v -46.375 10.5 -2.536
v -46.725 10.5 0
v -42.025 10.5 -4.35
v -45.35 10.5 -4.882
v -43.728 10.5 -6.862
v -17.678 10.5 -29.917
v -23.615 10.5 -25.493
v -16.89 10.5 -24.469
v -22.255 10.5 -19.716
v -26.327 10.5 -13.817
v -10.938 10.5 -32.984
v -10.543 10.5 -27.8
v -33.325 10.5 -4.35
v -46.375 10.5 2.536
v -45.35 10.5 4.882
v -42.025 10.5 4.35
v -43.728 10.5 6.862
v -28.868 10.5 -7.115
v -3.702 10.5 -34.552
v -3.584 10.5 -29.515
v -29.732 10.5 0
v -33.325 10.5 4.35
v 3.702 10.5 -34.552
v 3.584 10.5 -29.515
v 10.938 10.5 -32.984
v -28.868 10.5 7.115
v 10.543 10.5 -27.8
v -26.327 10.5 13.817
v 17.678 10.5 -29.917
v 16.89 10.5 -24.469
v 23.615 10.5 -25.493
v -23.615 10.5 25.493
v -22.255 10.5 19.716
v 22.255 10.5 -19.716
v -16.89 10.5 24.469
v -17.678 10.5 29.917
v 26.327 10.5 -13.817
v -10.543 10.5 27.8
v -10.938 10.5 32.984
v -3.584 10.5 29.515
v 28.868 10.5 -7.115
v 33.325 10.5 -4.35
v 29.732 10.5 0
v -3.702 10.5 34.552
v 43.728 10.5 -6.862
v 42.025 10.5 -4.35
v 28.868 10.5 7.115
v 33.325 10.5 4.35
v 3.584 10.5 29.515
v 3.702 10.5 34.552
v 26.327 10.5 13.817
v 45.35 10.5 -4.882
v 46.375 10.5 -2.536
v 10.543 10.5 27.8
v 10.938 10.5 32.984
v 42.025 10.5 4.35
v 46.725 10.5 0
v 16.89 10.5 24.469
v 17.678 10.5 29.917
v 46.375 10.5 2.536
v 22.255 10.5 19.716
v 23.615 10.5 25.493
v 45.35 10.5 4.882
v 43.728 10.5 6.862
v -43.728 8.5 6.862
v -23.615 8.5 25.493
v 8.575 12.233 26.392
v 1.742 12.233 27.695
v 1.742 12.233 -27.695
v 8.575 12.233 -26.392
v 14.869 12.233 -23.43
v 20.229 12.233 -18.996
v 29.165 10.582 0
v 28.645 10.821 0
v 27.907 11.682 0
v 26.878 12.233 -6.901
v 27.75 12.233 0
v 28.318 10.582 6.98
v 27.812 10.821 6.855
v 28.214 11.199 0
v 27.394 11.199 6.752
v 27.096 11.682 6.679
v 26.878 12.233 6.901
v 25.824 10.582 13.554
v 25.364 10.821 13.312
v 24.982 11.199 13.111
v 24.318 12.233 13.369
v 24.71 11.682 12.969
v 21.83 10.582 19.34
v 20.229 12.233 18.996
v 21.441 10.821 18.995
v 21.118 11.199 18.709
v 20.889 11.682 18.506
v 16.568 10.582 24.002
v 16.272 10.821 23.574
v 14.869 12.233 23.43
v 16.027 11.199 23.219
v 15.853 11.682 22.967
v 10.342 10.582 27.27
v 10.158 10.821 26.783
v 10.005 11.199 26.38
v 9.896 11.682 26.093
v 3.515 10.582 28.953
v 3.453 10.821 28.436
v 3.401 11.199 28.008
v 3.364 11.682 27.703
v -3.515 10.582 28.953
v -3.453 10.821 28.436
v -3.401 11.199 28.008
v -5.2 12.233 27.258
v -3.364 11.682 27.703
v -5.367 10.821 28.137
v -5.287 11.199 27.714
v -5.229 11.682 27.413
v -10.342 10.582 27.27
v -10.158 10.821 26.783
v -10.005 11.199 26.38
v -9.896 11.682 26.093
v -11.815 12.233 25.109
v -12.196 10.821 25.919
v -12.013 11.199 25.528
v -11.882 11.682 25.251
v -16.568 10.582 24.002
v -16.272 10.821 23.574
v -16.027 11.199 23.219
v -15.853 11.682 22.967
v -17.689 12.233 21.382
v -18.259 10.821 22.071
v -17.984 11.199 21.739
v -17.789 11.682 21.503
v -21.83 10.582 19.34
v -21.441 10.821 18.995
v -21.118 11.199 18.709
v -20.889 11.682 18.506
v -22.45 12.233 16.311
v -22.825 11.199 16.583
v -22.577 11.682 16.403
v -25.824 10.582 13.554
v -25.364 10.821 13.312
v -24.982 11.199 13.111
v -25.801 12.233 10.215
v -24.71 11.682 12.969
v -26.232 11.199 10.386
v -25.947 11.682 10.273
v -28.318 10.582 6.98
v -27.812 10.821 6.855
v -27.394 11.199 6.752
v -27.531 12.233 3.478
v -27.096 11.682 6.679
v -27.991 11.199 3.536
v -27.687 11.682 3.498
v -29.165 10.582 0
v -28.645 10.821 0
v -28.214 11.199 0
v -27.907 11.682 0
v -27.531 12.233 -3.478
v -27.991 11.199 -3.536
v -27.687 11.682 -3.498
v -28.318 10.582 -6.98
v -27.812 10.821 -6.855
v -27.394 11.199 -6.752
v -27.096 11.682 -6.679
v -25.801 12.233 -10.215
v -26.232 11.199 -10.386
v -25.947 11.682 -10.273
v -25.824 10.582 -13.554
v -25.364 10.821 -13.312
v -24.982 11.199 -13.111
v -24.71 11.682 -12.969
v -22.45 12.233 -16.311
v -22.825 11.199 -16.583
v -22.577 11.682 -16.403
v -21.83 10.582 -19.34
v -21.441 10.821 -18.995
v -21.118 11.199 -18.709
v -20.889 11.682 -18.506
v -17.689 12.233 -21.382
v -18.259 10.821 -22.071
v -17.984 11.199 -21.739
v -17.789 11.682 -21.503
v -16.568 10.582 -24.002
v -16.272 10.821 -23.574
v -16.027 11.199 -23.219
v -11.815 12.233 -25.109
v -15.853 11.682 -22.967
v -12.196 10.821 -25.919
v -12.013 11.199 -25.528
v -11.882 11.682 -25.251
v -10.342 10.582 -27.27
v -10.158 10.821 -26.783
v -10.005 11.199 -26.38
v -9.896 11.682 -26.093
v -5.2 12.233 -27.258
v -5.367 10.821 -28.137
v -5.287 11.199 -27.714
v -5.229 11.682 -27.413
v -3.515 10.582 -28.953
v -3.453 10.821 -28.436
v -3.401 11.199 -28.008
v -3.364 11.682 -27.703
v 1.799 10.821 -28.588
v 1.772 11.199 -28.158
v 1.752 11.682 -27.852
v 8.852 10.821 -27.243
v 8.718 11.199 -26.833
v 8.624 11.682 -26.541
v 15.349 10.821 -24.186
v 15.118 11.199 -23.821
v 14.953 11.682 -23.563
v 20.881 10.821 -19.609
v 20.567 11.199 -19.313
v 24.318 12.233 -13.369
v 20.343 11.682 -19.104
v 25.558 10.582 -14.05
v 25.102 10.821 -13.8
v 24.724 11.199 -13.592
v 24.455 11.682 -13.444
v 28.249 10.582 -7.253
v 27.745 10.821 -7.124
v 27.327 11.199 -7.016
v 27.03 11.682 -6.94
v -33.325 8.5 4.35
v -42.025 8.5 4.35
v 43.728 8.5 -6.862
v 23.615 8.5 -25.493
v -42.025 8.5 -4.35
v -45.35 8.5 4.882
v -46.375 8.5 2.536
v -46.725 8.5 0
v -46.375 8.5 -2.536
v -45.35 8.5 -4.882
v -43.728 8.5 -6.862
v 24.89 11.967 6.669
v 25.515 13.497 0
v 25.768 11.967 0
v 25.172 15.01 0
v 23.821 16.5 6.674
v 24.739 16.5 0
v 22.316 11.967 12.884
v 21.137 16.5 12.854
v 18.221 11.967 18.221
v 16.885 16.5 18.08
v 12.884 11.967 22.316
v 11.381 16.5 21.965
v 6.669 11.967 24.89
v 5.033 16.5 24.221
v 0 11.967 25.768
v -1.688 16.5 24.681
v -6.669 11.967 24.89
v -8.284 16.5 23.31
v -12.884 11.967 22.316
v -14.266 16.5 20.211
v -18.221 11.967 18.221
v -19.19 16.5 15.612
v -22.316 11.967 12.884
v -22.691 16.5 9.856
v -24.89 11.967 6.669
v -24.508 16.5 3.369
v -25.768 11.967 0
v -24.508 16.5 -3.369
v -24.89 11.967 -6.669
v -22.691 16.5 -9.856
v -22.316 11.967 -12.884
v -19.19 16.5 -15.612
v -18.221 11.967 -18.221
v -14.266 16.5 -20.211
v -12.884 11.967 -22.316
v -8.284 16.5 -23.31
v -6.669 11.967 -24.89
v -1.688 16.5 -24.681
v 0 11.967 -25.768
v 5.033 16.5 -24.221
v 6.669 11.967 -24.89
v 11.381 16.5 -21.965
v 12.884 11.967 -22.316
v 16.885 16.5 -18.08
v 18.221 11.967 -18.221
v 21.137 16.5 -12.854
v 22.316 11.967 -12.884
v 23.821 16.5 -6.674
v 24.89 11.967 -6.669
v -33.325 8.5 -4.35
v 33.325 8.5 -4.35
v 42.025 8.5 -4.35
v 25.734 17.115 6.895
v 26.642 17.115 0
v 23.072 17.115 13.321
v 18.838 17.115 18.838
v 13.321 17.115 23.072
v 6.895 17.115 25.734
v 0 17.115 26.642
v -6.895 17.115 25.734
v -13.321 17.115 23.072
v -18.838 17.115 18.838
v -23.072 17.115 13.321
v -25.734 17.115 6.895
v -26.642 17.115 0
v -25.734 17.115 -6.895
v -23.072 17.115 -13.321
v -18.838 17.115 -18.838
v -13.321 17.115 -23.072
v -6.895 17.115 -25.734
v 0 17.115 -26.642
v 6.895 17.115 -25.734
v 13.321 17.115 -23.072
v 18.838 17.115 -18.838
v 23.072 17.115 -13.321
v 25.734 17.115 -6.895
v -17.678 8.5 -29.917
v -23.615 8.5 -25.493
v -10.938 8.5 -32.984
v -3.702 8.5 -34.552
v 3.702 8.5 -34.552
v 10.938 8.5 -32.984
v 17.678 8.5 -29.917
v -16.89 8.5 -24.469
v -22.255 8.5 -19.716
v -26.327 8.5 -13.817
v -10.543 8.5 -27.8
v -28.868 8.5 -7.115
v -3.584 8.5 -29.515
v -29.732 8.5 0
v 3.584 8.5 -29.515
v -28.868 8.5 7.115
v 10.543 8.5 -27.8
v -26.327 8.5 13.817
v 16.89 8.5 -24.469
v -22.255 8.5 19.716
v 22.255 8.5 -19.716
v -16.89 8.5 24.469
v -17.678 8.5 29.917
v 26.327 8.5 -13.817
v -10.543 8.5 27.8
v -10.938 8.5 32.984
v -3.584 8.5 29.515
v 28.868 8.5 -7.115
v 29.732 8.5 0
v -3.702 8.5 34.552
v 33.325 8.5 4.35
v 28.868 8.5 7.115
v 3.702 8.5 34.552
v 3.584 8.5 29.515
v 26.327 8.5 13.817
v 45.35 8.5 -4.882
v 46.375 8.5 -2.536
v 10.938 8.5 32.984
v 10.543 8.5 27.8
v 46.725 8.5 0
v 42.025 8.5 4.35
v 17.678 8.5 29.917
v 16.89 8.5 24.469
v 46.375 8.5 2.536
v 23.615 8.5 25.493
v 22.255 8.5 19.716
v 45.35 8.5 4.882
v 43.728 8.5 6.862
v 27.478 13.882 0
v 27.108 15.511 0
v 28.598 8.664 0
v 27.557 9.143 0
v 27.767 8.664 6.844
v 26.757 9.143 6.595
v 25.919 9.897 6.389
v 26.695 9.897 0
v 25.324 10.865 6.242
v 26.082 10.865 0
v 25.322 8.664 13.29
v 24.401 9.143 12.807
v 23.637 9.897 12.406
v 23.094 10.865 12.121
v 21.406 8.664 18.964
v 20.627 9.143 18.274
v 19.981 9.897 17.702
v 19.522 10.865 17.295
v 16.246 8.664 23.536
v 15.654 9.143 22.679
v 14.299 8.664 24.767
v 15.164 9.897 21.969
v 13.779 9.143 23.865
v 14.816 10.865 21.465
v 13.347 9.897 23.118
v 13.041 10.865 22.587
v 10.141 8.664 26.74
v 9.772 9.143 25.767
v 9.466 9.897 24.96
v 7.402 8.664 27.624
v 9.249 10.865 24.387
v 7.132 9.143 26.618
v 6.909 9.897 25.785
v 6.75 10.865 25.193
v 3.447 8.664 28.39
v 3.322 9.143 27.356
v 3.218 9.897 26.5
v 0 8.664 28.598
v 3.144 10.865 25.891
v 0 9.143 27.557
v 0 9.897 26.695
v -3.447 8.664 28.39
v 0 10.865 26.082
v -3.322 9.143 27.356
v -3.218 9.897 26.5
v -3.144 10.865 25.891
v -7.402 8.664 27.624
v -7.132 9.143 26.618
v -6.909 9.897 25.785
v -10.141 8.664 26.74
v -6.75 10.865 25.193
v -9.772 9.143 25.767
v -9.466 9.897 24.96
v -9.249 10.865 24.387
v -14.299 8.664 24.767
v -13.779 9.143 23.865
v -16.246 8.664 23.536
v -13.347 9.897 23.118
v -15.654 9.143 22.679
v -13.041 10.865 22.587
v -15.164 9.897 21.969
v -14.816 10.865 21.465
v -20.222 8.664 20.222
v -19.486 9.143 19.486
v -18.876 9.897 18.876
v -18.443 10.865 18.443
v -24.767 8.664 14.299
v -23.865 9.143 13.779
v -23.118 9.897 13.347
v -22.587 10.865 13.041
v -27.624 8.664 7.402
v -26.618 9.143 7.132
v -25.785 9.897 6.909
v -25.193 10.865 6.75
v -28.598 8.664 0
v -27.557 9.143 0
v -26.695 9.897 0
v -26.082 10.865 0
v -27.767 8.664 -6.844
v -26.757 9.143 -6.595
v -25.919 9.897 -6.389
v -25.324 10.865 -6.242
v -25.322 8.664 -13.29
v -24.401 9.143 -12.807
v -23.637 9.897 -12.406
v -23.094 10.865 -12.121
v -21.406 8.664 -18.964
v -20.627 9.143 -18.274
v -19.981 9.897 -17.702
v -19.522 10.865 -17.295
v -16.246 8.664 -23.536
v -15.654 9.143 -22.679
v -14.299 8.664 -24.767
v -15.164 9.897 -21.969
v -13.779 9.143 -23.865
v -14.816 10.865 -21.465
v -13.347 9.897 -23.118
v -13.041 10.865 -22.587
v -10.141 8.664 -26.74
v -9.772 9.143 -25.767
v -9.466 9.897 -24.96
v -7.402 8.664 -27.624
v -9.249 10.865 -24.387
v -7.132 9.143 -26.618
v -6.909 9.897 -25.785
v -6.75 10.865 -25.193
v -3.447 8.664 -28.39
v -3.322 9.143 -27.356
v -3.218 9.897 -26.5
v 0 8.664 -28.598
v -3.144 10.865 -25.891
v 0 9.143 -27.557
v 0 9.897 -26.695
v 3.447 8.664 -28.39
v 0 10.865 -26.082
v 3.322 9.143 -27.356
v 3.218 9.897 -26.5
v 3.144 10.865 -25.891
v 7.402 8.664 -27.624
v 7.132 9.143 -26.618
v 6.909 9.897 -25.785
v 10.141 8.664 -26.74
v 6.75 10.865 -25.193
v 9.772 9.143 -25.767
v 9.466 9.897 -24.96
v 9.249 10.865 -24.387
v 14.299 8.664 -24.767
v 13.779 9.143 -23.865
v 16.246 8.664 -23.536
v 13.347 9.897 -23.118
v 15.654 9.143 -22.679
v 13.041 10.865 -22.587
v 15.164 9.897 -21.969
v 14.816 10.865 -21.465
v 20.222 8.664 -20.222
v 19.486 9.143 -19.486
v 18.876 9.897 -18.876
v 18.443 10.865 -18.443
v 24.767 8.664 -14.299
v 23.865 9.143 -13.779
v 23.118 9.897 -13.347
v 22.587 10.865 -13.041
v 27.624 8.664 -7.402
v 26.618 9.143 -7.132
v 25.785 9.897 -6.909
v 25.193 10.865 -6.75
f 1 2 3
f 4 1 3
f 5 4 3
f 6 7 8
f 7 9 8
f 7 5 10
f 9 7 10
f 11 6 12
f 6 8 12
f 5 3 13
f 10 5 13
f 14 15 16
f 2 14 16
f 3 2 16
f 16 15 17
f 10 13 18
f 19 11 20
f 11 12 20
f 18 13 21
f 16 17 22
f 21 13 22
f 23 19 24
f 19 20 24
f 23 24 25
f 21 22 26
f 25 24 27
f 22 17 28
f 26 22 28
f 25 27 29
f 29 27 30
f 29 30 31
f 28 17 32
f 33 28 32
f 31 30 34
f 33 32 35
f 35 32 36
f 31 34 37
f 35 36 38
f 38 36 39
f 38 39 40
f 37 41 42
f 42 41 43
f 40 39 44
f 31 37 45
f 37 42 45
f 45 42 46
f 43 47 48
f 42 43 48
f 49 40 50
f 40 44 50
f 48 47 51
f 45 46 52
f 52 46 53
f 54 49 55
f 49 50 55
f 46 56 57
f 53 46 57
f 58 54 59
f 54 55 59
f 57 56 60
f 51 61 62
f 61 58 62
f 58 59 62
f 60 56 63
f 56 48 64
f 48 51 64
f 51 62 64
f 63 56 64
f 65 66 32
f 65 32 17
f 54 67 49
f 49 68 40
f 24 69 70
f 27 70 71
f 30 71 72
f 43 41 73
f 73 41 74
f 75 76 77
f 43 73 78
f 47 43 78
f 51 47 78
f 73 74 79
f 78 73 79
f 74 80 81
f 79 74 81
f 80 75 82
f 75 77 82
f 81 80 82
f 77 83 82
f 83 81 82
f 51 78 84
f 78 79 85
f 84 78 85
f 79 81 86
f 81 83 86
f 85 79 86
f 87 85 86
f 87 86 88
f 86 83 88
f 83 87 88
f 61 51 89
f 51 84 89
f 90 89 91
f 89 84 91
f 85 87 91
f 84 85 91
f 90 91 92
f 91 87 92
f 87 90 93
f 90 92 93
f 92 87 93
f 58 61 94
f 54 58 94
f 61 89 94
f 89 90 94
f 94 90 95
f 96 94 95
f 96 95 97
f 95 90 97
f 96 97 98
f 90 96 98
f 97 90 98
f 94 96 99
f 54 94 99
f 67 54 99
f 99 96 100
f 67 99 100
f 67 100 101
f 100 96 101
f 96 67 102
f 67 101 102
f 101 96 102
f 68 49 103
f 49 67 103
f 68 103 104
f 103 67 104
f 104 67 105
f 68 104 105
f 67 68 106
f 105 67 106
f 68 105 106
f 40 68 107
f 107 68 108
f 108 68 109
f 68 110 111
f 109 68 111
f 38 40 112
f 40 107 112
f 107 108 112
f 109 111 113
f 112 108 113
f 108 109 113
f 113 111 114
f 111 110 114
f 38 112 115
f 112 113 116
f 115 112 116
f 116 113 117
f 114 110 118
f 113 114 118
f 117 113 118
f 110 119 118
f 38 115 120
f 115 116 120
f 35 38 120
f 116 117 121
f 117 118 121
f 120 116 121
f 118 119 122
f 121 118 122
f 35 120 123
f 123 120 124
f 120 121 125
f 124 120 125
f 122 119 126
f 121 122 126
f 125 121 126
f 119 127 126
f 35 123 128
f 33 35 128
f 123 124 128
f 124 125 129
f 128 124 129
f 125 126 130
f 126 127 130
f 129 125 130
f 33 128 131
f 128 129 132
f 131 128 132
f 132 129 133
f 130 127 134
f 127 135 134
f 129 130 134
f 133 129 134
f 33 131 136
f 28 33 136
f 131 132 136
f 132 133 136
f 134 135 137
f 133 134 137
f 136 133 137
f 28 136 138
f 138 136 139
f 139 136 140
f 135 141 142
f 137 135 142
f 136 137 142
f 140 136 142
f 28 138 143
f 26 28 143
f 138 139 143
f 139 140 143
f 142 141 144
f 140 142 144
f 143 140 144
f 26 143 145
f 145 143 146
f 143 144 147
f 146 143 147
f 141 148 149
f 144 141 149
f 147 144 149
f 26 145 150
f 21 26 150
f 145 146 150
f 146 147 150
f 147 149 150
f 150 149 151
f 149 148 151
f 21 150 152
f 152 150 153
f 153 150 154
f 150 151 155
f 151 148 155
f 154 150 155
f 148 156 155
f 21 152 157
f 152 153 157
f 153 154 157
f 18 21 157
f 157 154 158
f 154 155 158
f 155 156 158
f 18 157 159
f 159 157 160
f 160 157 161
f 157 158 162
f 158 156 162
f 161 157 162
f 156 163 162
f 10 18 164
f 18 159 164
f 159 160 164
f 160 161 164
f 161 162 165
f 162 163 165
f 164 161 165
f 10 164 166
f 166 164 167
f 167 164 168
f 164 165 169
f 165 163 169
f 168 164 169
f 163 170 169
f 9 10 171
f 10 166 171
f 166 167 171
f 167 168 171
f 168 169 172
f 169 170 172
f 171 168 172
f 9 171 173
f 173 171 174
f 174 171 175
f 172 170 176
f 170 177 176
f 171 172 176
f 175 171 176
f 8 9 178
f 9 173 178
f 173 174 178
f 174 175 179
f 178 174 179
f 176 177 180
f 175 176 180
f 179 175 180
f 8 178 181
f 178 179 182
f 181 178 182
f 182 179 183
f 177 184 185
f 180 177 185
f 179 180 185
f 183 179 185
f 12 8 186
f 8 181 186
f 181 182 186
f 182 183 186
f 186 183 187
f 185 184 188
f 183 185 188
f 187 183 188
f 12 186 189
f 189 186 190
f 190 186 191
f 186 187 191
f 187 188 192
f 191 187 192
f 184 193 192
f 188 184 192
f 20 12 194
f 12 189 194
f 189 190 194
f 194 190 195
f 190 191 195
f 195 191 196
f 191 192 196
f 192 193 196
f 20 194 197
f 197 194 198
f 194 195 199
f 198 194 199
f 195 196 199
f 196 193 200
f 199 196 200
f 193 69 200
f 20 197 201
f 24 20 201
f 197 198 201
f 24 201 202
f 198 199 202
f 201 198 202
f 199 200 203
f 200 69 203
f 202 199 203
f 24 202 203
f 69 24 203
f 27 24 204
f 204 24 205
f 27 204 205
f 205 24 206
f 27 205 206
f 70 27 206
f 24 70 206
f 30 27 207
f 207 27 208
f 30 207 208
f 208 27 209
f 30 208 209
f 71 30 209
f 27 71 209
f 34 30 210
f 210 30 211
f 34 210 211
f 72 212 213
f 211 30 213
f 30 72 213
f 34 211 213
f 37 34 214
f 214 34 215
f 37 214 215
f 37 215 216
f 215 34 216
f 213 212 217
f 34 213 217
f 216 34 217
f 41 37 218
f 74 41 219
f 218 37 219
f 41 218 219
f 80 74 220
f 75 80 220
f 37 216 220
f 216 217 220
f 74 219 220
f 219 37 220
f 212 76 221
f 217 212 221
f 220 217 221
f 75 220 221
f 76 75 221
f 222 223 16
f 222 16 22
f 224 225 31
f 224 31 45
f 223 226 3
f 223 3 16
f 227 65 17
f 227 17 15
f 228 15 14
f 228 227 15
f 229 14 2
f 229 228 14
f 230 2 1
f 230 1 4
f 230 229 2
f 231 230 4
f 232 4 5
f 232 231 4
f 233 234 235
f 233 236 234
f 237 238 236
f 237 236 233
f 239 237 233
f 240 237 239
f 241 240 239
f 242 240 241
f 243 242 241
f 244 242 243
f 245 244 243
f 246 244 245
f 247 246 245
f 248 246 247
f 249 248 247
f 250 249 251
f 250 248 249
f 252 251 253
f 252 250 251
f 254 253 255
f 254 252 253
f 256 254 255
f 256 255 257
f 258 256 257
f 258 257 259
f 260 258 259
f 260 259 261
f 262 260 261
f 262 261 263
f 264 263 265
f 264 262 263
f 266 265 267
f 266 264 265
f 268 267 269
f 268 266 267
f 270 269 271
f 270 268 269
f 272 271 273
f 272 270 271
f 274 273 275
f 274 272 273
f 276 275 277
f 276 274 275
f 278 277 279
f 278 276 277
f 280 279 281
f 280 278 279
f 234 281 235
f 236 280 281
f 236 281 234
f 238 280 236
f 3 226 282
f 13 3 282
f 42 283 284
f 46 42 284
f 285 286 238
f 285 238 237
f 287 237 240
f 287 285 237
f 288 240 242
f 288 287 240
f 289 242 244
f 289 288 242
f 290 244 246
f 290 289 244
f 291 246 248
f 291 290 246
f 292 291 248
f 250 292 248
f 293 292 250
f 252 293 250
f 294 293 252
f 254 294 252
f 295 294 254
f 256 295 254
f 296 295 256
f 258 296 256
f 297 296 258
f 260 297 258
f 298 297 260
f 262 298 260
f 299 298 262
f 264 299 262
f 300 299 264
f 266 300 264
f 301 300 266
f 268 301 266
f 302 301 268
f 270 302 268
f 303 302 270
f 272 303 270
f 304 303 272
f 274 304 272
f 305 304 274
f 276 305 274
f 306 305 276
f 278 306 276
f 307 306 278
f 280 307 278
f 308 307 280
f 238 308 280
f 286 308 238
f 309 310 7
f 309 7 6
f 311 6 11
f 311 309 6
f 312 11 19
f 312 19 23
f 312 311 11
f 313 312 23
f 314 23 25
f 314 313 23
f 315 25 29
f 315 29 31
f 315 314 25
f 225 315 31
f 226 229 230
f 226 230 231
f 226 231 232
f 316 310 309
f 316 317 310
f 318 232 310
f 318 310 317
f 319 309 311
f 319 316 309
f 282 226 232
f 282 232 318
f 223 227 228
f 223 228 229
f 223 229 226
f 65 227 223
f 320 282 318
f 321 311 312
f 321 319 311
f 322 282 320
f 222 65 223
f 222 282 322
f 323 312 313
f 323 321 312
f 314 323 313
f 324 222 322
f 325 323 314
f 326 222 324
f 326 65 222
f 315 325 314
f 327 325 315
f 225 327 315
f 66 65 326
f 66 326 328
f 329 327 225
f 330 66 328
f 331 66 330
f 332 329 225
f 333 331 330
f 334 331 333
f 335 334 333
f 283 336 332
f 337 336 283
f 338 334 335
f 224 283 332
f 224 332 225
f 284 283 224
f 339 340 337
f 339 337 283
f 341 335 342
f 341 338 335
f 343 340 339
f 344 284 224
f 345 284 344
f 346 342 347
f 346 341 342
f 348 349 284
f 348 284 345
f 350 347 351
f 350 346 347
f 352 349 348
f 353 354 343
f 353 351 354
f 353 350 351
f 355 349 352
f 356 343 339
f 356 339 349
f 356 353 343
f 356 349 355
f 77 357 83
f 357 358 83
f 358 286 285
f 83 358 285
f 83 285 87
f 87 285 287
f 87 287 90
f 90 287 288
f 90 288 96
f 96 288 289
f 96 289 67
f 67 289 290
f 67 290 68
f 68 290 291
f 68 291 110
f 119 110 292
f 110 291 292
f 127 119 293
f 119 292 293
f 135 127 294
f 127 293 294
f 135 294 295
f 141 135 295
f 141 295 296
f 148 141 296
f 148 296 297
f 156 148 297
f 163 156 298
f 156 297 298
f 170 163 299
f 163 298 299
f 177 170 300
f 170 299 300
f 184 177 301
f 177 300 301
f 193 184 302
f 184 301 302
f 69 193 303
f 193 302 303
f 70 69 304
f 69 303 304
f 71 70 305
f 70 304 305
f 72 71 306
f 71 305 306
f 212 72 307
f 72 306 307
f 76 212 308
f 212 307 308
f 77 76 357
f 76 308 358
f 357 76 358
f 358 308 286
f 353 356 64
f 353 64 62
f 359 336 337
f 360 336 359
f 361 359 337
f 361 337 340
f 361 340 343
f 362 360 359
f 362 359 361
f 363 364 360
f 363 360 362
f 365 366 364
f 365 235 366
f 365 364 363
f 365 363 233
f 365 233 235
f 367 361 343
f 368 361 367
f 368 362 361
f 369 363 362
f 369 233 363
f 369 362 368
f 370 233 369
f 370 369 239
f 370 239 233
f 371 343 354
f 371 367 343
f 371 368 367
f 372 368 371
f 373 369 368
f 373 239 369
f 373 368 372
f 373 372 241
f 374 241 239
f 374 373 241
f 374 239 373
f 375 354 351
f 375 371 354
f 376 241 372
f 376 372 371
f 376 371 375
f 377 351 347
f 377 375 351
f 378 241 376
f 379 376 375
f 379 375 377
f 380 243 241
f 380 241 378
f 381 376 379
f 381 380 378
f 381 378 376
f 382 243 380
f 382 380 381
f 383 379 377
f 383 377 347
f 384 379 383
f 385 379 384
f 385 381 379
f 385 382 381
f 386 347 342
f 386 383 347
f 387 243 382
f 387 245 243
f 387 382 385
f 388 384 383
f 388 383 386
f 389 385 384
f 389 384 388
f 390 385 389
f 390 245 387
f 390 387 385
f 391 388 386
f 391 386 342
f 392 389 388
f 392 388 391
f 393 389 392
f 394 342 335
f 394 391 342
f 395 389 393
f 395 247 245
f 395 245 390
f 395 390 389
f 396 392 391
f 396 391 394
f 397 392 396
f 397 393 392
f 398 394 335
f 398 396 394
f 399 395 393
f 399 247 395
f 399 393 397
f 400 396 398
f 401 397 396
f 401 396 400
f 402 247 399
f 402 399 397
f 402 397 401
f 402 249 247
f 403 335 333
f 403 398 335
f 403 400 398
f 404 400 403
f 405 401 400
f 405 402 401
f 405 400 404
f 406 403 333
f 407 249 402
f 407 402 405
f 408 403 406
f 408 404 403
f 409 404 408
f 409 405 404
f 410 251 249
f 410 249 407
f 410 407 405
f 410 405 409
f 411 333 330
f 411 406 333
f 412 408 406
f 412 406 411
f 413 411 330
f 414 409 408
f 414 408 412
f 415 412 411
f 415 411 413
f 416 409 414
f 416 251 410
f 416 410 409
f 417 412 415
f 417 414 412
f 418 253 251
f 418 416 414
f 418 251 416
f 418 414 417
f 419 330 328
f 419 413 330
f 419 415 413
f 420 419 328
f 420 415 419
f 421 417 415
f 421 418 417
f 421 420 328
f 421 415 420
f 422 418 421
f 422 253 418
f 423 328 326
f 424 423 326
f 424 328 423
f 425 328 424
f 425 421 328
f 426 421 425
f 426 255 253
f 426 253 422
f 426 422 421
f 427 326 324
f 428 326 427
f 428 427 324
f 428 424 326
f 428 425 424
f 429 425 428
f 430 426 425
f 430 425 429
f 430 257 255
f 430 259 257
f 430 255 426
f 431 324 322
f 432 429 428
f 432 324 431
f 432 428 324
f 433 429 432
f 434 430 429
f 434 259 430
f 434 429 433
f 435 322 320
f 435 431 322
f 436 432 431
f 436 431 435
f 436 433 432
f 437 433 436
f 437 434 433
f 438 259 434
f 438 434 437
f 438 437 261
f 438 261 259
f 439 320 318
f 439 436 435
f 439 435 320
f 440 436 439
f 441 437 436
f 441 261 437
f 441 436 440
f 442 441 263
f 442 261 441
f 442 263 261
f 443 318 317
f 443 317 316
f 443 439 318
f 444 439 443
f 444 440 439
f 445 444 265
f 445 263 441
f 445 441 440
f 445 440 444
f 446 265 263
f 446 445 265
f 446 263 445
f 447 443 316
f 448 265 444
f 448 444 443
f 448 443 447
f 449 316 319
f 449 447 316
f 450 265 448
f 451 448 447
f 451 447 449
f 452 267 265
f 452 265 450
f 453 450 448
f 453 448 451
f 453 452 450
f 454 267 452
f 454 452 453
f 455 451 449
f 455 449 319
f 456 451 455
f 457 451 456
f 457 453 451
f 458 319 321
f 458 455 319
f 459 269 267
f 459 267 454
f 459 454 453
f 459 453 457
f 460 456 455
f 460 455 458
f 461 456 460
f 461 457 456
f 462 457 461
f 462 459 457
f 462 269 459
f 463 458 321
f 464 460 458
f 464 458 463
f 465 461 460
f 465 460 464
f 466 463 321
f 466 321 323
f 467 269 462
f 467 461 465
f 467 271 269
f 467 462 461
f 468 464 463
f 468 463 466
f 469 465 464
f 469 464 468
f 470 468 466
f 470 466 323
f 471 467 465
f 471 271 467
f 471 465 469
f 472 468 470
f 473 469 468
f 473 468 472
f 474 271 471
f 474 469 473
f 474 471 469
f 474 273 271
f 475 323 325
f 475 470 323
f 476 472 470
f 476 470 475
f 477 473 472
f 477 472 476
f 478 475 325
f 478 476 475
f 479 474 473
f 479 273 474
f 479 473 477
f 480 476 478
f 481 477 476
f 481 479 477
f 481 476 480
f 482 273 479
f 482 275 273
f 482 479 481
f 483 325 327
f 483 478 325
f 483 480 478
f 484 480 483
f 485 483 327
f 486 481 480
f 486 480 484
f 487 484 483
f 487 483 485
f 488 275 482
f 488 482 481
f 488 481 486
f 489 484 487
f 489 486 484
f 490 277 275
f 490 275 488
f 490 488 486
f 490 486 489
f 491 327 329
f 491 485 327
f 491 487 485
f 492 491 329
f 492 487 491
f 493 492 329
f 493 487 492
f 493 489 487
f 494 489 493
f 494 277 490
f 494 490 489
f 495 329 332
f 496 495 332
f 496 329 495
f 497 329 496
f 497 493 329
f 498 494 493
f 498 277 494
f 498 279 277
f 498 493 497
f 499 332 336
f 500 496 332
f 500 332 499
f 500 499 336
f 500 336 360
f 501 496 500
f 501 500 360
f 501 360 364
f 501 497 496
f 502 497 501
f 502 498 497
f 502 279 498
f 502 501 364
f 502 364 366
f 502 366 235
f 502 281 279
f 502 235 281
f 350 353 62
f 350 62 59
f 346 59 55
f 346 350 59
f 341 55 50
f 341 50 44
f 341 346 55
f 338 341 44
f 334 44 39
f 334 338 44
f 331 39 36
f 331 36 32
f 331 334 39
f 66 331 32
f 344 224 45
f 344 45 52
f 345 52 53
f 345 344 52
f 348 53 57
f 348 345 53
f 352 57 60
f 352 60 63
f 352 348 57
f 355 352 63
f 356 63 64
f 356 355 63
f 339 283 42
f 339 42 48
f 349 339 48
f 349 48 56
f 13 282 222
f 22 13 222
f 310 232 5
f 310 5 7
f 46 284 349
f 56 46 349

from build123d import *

# Parameters (mm, degrees)
THICKEN_1_T2        = 2
SKETCH_2_R          = 29.732137495
EXTRUDE_1_DEPTH     = 2
SKETCH_2_3_W        = 8.7
SKETCH_2_3_H        = 8.7
CUT_EXTRUDE_1_DEPTH = 59.86436084


with BuildPart() as body_1:
    # Sheet Revolve 1: a surface, the sketch's curves turned about an axis
    with BuildLine(Plane.XY, mode=Mode.PRIVATE) as sheet_revolve_1_1_path:
        Line((34.75, 8.5), (29.732137495, 8.5))
        ThreePointArc((29.732137495, 8.5), (27.09901514, 9.488909389), (25.767852495, 11.966666667))
        ThreePointArc((25.767852495, 11.966666667), (25.354764169, 14.256382016), (24.738633754, 16.5))
    sheet_revolve_1_1 = Shell.revolve(sheet_revolve_1_1_path.wire(), 360, Axis((0, 50, 0), (0, -1, 0)))
    add(Solid.thicken(sheet_revolve_1_1, -THICKEN_1_T2))

    # Sketch 2 → Extrude 1 (add)
    with BuildSketch(Plane.XZ.offset(-8.5)):
        with BuildLine():
            Line((-23.614933424, 25.493085717), (-43.727741416, 6.862048778))
            ThreePointArc((-43.727741416, 6.862048778), (-46.725, 0), (-43.727741416, -6.862048778))
            Line((-43.727741416, -6.862048778), (-23.614933424, -25.493085717))
            ThreePointArc((-23.614933424, -25.493085717), (0, -34.75), (23.614933424, -25.493085717))
            Line((23.614933424, -25.493085717), (43.727741416, -6.862048778))
            ThreePointArc((43.727741416, -6.862048778), (46.725, 0), (43.727741416, 6.862048778))
            Line((43.727741416, 6.862048778), (23.614933424, 25.493085717))
            ThreePointArc((23.614933424, 25.493085717), (0, 34.75), (-23.614933424, 25.493085717))
        make_face()
        Circle(SKETCH_2_R, mode=Mode.SUBTRACT)
    extrude(amount=-EXTRUDE_1_DEPTH)

    # Sketch 2_3 → Cut-Extrude 1 (cut, through all)
    with BuildSketch(Plane.XZ.offset(-8.5)):
        with Locations((-37.675, 0)):
            Rectangle(SKETCH_2_3_W, SKETCH_2_3_H)
        with Locations((37.675, 0)):
            Rectangle(SKETCH_2_3_W, SKETCH_2_3_H)
    extrude(amount=-CUT_EXTRUDE_1_DEPTH, mode=Mode.SUBTRACT)


solid = body_1.part
